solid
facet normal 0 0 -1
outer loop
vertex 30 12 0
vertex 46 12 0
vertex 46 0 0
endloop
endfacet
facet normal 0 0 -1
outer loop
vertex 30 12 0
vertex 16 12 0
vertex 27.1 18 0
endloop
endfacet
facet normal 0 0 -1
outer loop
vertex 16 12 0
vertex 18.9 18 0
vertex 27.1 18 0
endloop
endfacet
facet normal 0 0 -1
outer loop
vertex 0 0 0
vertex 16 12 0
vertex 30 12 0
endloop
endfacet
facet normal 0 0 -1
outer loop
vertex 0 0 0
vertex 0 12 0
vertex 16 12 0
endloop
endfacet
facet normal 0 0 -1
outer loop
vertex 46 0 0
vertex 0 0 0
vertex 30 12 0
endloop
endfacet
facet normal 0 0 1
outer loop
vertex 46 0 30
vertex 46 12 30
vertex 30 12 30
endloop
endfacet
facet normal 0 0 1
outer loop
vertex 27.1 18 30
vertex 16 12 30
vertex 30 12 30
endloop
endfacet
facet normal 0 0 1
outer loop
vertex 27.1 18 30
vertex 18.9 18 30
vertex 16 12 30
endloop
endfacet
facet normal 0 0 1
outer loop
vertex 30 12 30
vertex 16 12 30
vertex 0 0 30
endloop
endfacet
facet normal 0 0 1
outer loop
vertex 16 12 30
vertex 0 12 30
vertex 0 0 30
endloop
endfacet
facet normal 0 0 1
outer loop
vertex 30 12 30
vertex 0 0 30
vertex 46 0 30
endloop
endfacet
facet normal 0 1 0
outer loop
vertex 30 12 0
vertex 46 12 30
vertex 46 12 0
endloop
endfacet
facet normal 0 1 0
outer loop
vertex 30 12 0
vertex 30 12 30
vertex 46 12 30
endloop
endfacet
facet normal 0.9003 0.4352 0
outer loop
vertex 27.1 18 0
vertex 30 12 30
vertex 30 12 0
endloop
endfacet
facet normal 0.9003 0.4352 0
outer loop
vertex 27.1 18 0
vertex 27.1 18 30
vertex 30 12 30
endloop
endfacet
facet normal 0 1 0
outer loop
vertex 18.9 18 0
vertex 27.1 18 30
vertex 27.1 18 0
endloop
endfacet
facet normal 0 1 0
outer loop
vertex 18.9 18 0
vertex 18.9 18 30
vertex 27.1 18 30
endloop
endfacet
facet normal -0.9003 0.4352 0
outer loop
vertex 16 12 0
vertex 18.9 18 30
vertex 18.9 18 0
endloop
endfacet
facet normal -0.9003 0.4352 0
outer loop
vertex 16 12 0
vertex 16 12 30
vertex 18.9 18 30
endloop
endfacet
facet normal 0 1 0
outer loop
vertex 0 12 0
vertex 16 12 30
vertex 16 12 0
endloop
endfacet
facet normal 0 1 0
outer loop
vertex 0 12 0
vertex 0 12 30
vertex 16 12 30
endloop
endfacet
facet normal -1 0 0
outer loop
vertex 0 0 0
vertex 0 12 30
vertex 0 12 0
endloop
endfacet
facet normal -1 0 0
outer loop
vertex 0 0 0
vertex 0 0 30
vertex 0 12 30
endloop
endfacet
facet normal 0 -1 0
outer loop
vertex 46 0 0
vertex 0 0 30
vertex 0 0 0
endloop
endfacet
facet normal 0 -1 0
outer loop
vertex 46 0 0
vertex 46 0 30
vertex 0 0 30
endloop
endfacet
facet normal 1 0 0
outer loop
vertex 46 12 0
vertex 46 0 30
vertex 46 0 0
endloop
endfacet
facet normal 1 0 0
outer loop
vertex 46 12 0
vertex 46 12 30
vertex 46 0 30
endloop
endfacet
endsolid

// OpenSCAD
$fn = 32;

// ----------------------------------------------------------------------
// V guide rail: dovetail, 46 mm wide
// ----------------------------------------------------------------------

// --- parameters (mm) ---
rail_w = 46;              // rail width, X
base_t = 12;              // base plate thickness
v_depth = 6;              // V feature depth / height
v_half_w = 7;             // half width of the V at the base face
plate_t = 30;             // rail length, Z (the extrusion height)
top_half_w = 4.1;         // half width at the dovetail top

dovetail_base = 2 * v_half_w;  // dovetail width at the base
dovetail_top = 2 * top_half_w;  // dovetail width at the top

profile = [[0, 0], [46, 0], [46, 12], [30, 12], [27.1, 18], [18.9, 18], [16, 12], [0, 12]];  // primary outline, 8 points, counter clockwise

// --- the one profile operation ---
linear_extrude(height = plate_t) polygon(points = profile);
